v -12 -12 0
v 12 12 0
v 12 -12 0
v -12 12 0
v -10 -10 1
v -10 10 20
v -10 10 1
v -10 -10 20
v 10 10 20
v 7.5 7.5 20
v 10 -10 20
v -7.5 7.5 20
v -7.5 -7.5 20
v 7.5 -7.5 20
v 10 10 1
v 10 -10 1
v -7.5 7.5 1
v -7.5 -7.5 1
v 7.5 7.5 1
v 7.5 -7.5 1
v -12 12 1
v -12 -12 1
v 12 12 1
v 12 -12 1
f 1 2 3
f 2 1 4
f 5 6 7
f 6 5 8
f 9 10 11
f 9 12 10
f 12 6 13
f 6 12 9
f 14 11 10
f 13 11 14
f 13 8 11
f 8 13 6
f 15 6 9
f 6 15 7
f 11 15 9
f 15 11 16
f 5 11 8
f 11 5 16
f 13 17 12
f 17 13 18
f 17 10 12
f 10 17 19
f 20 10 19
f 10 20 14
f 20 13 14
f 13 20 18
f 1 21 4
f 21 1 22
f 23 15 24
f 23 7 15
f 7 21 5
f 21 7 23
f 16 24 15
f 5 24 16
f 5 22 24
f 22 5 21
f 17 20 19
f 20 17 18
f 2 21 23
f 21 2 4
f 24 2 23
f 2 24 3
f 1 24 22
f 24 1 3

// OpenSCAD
////////////////////////////////////////////
// NMC3D Print Club                       //
// Make A Blanking Plate                  // 
////////////////////////////////////////////


// Call blanking_plate()
blanking_plate(20, 20, 20, 5, 1,"red");

// MODULE DEFINITIONS

// Make a basic cube module

module myCube(width,depth,my_height,my_colour){
    // note the command 'color' is US spelling
    color(my_colour)
            // extrude the following object by my_height 
            linear_extrude(height = my_height)
                // draw the square to be extruded, make it draw from the centre
                square([width, depth], center = true);
}

// Make a blanking plate module
// We'll use external dimensions for the outermost edge of the object then subtract the wall_thickness from the external dimensions to workout the size of the void inside

module blanking_plate(external_width, external_depth, external_height, wall_thickness, lid_height, colour){
    // Use difference() function to remove one shape from another
    // Second and following shapes are removed from the first
    difference(){
        translate([0, 0, 0])
            myCube(external_width, external_depth,external_height, "red");
        translate([0, 0, -1])
            // subtract wall_thickness and add 1mm to clear the void
            myCube(external_width-wall_thickness, external_depth-wall_thickness,external_height+2,"green");
        }
    myCube(external_width + 4, external_depth + 4,lid_height, "red");
}

// Make by @cheapjack
//
// To the extent possible under law, the author(s) have dedicated all
// copyright and related and neighboring rights to this software to the
// public domain worldwide. This software is distributed without any
// warranty.
//
// LICENSE <http://creativecommons.org/publicdomain/zero/1.0/>.
